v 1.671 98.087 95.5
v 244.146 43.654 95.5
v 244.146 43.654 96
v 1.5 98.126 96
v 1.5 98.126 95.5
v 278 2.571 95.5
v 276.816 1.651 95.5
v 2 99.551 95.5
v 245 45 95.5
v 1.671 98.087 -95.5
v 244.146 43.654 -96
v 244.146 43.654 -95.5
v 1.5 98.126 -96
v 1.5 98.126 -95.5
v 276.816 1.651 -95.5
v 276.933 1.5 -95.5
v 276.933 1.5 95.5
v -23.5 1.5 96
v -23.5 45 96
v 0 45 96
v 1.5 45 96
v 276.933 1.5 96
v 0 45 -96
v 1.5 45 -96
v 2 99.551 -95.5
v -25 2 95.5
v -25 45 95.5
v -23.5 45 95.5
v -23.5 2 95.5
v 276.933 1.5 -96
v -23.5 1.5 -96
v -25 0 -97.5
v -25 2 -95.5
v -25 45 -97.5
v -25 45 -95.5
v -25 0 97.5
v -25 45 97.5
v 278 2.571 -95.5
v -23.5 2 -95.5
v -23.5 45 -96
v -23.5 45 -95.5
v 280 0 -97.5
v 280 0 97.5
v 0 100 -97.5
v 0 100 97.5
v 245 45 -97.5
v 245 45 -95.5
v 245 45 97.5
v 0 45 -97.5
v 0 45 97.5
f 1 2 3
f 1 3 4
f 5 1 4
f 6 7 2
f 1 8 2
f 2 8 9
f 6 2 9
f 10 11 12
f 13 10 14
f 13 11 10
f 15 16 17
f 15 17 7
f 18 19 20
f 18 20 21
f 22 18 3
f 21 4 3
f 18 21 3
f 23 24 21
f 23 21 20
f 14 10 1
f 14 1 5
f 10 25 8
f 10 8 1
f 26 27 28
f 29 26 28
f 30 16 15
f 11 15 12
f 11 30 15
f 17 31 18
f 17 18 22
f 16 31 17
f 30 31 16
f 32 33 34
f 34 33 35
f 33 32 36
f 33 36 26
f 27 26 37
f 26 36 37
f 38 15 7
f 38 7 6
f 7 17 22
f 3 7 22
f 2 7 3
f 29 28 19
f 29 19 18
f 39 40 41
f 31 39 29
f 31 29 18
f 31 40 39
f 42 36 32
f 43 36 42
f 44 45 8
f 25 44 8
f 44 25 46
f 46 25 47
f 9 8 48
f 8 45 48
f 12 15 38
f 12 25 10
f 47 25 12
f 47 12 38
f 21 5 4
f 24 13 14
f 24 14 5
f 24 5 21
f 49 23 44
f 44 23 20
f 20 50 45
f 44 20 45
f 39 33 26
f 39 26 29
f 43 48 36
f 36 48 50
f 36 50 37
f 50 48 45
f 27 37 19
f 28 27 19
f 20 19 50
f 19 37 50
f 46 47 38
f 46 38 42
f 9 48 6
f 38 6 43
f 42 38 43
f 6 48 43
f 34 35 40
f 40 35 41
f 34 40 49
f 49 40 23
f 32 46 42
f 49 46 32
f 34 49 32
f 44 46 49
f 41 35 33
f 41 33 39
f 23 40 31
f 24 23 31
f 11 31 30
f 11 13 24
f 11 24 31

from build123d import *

# Parameters (mm, degrees)
BOSS_EXTRUDE1_DEPTH = 97.5
SHELL2_START        = -95.5
SHELL2_DEPTH        = 191
SHELL2_START_2      = -96
SHELL2_2_DEPTH      = 192


with BuildPart() as part:
    # Sketch2 → Boss-Extrude1 (new, symmetric)
    with BuildSketch(Plane.XY):
        Polygon((0, 100), (245, 45), (280, 0), (0, 0), (-25, 0), (-25, 45), (0, 45), align=None)
    extrude(amount=BOSS_EXTRUDE1_DEPTH, both=True)

    # Shell2: read off the stored shape, not the designer's step
    # Shell2 outline → Shell2 (cut)
    with BuildSketch(Plane.XY.offset(SHELL2_START)):
        Polygon((-25, 45), (-25, 2), (-23.5, 2), (-23.5, 1.5), (276.933040958, 1.5), (276.815971674, 1.650517651), (278, 2.571428571), (245, 45), (2, 99.551020408), (1.671442487, 98.08744603), (1.5, 98.125933119), (1.5, 45), align=None)
    extrude(amount=SHELL2_DEPTH, mode=Mode.SUBTRACT)

    # Shell2 2 outline → Shell2 2 (cut)
    with BuildSketch(Plane.XY.offset(SHELL2_START_2)):
        Polygon((-23.5, 45), (-23.5, 1.5), (276.933040958, 1.5), (244.146362645, 43.654300688), (1.5, 98.125933119), (1.5, 45), align=None)
    extrude(amount=SHELL2_2_DEPTH, mode=Mode.SUBTRACT)


solid = part.part
